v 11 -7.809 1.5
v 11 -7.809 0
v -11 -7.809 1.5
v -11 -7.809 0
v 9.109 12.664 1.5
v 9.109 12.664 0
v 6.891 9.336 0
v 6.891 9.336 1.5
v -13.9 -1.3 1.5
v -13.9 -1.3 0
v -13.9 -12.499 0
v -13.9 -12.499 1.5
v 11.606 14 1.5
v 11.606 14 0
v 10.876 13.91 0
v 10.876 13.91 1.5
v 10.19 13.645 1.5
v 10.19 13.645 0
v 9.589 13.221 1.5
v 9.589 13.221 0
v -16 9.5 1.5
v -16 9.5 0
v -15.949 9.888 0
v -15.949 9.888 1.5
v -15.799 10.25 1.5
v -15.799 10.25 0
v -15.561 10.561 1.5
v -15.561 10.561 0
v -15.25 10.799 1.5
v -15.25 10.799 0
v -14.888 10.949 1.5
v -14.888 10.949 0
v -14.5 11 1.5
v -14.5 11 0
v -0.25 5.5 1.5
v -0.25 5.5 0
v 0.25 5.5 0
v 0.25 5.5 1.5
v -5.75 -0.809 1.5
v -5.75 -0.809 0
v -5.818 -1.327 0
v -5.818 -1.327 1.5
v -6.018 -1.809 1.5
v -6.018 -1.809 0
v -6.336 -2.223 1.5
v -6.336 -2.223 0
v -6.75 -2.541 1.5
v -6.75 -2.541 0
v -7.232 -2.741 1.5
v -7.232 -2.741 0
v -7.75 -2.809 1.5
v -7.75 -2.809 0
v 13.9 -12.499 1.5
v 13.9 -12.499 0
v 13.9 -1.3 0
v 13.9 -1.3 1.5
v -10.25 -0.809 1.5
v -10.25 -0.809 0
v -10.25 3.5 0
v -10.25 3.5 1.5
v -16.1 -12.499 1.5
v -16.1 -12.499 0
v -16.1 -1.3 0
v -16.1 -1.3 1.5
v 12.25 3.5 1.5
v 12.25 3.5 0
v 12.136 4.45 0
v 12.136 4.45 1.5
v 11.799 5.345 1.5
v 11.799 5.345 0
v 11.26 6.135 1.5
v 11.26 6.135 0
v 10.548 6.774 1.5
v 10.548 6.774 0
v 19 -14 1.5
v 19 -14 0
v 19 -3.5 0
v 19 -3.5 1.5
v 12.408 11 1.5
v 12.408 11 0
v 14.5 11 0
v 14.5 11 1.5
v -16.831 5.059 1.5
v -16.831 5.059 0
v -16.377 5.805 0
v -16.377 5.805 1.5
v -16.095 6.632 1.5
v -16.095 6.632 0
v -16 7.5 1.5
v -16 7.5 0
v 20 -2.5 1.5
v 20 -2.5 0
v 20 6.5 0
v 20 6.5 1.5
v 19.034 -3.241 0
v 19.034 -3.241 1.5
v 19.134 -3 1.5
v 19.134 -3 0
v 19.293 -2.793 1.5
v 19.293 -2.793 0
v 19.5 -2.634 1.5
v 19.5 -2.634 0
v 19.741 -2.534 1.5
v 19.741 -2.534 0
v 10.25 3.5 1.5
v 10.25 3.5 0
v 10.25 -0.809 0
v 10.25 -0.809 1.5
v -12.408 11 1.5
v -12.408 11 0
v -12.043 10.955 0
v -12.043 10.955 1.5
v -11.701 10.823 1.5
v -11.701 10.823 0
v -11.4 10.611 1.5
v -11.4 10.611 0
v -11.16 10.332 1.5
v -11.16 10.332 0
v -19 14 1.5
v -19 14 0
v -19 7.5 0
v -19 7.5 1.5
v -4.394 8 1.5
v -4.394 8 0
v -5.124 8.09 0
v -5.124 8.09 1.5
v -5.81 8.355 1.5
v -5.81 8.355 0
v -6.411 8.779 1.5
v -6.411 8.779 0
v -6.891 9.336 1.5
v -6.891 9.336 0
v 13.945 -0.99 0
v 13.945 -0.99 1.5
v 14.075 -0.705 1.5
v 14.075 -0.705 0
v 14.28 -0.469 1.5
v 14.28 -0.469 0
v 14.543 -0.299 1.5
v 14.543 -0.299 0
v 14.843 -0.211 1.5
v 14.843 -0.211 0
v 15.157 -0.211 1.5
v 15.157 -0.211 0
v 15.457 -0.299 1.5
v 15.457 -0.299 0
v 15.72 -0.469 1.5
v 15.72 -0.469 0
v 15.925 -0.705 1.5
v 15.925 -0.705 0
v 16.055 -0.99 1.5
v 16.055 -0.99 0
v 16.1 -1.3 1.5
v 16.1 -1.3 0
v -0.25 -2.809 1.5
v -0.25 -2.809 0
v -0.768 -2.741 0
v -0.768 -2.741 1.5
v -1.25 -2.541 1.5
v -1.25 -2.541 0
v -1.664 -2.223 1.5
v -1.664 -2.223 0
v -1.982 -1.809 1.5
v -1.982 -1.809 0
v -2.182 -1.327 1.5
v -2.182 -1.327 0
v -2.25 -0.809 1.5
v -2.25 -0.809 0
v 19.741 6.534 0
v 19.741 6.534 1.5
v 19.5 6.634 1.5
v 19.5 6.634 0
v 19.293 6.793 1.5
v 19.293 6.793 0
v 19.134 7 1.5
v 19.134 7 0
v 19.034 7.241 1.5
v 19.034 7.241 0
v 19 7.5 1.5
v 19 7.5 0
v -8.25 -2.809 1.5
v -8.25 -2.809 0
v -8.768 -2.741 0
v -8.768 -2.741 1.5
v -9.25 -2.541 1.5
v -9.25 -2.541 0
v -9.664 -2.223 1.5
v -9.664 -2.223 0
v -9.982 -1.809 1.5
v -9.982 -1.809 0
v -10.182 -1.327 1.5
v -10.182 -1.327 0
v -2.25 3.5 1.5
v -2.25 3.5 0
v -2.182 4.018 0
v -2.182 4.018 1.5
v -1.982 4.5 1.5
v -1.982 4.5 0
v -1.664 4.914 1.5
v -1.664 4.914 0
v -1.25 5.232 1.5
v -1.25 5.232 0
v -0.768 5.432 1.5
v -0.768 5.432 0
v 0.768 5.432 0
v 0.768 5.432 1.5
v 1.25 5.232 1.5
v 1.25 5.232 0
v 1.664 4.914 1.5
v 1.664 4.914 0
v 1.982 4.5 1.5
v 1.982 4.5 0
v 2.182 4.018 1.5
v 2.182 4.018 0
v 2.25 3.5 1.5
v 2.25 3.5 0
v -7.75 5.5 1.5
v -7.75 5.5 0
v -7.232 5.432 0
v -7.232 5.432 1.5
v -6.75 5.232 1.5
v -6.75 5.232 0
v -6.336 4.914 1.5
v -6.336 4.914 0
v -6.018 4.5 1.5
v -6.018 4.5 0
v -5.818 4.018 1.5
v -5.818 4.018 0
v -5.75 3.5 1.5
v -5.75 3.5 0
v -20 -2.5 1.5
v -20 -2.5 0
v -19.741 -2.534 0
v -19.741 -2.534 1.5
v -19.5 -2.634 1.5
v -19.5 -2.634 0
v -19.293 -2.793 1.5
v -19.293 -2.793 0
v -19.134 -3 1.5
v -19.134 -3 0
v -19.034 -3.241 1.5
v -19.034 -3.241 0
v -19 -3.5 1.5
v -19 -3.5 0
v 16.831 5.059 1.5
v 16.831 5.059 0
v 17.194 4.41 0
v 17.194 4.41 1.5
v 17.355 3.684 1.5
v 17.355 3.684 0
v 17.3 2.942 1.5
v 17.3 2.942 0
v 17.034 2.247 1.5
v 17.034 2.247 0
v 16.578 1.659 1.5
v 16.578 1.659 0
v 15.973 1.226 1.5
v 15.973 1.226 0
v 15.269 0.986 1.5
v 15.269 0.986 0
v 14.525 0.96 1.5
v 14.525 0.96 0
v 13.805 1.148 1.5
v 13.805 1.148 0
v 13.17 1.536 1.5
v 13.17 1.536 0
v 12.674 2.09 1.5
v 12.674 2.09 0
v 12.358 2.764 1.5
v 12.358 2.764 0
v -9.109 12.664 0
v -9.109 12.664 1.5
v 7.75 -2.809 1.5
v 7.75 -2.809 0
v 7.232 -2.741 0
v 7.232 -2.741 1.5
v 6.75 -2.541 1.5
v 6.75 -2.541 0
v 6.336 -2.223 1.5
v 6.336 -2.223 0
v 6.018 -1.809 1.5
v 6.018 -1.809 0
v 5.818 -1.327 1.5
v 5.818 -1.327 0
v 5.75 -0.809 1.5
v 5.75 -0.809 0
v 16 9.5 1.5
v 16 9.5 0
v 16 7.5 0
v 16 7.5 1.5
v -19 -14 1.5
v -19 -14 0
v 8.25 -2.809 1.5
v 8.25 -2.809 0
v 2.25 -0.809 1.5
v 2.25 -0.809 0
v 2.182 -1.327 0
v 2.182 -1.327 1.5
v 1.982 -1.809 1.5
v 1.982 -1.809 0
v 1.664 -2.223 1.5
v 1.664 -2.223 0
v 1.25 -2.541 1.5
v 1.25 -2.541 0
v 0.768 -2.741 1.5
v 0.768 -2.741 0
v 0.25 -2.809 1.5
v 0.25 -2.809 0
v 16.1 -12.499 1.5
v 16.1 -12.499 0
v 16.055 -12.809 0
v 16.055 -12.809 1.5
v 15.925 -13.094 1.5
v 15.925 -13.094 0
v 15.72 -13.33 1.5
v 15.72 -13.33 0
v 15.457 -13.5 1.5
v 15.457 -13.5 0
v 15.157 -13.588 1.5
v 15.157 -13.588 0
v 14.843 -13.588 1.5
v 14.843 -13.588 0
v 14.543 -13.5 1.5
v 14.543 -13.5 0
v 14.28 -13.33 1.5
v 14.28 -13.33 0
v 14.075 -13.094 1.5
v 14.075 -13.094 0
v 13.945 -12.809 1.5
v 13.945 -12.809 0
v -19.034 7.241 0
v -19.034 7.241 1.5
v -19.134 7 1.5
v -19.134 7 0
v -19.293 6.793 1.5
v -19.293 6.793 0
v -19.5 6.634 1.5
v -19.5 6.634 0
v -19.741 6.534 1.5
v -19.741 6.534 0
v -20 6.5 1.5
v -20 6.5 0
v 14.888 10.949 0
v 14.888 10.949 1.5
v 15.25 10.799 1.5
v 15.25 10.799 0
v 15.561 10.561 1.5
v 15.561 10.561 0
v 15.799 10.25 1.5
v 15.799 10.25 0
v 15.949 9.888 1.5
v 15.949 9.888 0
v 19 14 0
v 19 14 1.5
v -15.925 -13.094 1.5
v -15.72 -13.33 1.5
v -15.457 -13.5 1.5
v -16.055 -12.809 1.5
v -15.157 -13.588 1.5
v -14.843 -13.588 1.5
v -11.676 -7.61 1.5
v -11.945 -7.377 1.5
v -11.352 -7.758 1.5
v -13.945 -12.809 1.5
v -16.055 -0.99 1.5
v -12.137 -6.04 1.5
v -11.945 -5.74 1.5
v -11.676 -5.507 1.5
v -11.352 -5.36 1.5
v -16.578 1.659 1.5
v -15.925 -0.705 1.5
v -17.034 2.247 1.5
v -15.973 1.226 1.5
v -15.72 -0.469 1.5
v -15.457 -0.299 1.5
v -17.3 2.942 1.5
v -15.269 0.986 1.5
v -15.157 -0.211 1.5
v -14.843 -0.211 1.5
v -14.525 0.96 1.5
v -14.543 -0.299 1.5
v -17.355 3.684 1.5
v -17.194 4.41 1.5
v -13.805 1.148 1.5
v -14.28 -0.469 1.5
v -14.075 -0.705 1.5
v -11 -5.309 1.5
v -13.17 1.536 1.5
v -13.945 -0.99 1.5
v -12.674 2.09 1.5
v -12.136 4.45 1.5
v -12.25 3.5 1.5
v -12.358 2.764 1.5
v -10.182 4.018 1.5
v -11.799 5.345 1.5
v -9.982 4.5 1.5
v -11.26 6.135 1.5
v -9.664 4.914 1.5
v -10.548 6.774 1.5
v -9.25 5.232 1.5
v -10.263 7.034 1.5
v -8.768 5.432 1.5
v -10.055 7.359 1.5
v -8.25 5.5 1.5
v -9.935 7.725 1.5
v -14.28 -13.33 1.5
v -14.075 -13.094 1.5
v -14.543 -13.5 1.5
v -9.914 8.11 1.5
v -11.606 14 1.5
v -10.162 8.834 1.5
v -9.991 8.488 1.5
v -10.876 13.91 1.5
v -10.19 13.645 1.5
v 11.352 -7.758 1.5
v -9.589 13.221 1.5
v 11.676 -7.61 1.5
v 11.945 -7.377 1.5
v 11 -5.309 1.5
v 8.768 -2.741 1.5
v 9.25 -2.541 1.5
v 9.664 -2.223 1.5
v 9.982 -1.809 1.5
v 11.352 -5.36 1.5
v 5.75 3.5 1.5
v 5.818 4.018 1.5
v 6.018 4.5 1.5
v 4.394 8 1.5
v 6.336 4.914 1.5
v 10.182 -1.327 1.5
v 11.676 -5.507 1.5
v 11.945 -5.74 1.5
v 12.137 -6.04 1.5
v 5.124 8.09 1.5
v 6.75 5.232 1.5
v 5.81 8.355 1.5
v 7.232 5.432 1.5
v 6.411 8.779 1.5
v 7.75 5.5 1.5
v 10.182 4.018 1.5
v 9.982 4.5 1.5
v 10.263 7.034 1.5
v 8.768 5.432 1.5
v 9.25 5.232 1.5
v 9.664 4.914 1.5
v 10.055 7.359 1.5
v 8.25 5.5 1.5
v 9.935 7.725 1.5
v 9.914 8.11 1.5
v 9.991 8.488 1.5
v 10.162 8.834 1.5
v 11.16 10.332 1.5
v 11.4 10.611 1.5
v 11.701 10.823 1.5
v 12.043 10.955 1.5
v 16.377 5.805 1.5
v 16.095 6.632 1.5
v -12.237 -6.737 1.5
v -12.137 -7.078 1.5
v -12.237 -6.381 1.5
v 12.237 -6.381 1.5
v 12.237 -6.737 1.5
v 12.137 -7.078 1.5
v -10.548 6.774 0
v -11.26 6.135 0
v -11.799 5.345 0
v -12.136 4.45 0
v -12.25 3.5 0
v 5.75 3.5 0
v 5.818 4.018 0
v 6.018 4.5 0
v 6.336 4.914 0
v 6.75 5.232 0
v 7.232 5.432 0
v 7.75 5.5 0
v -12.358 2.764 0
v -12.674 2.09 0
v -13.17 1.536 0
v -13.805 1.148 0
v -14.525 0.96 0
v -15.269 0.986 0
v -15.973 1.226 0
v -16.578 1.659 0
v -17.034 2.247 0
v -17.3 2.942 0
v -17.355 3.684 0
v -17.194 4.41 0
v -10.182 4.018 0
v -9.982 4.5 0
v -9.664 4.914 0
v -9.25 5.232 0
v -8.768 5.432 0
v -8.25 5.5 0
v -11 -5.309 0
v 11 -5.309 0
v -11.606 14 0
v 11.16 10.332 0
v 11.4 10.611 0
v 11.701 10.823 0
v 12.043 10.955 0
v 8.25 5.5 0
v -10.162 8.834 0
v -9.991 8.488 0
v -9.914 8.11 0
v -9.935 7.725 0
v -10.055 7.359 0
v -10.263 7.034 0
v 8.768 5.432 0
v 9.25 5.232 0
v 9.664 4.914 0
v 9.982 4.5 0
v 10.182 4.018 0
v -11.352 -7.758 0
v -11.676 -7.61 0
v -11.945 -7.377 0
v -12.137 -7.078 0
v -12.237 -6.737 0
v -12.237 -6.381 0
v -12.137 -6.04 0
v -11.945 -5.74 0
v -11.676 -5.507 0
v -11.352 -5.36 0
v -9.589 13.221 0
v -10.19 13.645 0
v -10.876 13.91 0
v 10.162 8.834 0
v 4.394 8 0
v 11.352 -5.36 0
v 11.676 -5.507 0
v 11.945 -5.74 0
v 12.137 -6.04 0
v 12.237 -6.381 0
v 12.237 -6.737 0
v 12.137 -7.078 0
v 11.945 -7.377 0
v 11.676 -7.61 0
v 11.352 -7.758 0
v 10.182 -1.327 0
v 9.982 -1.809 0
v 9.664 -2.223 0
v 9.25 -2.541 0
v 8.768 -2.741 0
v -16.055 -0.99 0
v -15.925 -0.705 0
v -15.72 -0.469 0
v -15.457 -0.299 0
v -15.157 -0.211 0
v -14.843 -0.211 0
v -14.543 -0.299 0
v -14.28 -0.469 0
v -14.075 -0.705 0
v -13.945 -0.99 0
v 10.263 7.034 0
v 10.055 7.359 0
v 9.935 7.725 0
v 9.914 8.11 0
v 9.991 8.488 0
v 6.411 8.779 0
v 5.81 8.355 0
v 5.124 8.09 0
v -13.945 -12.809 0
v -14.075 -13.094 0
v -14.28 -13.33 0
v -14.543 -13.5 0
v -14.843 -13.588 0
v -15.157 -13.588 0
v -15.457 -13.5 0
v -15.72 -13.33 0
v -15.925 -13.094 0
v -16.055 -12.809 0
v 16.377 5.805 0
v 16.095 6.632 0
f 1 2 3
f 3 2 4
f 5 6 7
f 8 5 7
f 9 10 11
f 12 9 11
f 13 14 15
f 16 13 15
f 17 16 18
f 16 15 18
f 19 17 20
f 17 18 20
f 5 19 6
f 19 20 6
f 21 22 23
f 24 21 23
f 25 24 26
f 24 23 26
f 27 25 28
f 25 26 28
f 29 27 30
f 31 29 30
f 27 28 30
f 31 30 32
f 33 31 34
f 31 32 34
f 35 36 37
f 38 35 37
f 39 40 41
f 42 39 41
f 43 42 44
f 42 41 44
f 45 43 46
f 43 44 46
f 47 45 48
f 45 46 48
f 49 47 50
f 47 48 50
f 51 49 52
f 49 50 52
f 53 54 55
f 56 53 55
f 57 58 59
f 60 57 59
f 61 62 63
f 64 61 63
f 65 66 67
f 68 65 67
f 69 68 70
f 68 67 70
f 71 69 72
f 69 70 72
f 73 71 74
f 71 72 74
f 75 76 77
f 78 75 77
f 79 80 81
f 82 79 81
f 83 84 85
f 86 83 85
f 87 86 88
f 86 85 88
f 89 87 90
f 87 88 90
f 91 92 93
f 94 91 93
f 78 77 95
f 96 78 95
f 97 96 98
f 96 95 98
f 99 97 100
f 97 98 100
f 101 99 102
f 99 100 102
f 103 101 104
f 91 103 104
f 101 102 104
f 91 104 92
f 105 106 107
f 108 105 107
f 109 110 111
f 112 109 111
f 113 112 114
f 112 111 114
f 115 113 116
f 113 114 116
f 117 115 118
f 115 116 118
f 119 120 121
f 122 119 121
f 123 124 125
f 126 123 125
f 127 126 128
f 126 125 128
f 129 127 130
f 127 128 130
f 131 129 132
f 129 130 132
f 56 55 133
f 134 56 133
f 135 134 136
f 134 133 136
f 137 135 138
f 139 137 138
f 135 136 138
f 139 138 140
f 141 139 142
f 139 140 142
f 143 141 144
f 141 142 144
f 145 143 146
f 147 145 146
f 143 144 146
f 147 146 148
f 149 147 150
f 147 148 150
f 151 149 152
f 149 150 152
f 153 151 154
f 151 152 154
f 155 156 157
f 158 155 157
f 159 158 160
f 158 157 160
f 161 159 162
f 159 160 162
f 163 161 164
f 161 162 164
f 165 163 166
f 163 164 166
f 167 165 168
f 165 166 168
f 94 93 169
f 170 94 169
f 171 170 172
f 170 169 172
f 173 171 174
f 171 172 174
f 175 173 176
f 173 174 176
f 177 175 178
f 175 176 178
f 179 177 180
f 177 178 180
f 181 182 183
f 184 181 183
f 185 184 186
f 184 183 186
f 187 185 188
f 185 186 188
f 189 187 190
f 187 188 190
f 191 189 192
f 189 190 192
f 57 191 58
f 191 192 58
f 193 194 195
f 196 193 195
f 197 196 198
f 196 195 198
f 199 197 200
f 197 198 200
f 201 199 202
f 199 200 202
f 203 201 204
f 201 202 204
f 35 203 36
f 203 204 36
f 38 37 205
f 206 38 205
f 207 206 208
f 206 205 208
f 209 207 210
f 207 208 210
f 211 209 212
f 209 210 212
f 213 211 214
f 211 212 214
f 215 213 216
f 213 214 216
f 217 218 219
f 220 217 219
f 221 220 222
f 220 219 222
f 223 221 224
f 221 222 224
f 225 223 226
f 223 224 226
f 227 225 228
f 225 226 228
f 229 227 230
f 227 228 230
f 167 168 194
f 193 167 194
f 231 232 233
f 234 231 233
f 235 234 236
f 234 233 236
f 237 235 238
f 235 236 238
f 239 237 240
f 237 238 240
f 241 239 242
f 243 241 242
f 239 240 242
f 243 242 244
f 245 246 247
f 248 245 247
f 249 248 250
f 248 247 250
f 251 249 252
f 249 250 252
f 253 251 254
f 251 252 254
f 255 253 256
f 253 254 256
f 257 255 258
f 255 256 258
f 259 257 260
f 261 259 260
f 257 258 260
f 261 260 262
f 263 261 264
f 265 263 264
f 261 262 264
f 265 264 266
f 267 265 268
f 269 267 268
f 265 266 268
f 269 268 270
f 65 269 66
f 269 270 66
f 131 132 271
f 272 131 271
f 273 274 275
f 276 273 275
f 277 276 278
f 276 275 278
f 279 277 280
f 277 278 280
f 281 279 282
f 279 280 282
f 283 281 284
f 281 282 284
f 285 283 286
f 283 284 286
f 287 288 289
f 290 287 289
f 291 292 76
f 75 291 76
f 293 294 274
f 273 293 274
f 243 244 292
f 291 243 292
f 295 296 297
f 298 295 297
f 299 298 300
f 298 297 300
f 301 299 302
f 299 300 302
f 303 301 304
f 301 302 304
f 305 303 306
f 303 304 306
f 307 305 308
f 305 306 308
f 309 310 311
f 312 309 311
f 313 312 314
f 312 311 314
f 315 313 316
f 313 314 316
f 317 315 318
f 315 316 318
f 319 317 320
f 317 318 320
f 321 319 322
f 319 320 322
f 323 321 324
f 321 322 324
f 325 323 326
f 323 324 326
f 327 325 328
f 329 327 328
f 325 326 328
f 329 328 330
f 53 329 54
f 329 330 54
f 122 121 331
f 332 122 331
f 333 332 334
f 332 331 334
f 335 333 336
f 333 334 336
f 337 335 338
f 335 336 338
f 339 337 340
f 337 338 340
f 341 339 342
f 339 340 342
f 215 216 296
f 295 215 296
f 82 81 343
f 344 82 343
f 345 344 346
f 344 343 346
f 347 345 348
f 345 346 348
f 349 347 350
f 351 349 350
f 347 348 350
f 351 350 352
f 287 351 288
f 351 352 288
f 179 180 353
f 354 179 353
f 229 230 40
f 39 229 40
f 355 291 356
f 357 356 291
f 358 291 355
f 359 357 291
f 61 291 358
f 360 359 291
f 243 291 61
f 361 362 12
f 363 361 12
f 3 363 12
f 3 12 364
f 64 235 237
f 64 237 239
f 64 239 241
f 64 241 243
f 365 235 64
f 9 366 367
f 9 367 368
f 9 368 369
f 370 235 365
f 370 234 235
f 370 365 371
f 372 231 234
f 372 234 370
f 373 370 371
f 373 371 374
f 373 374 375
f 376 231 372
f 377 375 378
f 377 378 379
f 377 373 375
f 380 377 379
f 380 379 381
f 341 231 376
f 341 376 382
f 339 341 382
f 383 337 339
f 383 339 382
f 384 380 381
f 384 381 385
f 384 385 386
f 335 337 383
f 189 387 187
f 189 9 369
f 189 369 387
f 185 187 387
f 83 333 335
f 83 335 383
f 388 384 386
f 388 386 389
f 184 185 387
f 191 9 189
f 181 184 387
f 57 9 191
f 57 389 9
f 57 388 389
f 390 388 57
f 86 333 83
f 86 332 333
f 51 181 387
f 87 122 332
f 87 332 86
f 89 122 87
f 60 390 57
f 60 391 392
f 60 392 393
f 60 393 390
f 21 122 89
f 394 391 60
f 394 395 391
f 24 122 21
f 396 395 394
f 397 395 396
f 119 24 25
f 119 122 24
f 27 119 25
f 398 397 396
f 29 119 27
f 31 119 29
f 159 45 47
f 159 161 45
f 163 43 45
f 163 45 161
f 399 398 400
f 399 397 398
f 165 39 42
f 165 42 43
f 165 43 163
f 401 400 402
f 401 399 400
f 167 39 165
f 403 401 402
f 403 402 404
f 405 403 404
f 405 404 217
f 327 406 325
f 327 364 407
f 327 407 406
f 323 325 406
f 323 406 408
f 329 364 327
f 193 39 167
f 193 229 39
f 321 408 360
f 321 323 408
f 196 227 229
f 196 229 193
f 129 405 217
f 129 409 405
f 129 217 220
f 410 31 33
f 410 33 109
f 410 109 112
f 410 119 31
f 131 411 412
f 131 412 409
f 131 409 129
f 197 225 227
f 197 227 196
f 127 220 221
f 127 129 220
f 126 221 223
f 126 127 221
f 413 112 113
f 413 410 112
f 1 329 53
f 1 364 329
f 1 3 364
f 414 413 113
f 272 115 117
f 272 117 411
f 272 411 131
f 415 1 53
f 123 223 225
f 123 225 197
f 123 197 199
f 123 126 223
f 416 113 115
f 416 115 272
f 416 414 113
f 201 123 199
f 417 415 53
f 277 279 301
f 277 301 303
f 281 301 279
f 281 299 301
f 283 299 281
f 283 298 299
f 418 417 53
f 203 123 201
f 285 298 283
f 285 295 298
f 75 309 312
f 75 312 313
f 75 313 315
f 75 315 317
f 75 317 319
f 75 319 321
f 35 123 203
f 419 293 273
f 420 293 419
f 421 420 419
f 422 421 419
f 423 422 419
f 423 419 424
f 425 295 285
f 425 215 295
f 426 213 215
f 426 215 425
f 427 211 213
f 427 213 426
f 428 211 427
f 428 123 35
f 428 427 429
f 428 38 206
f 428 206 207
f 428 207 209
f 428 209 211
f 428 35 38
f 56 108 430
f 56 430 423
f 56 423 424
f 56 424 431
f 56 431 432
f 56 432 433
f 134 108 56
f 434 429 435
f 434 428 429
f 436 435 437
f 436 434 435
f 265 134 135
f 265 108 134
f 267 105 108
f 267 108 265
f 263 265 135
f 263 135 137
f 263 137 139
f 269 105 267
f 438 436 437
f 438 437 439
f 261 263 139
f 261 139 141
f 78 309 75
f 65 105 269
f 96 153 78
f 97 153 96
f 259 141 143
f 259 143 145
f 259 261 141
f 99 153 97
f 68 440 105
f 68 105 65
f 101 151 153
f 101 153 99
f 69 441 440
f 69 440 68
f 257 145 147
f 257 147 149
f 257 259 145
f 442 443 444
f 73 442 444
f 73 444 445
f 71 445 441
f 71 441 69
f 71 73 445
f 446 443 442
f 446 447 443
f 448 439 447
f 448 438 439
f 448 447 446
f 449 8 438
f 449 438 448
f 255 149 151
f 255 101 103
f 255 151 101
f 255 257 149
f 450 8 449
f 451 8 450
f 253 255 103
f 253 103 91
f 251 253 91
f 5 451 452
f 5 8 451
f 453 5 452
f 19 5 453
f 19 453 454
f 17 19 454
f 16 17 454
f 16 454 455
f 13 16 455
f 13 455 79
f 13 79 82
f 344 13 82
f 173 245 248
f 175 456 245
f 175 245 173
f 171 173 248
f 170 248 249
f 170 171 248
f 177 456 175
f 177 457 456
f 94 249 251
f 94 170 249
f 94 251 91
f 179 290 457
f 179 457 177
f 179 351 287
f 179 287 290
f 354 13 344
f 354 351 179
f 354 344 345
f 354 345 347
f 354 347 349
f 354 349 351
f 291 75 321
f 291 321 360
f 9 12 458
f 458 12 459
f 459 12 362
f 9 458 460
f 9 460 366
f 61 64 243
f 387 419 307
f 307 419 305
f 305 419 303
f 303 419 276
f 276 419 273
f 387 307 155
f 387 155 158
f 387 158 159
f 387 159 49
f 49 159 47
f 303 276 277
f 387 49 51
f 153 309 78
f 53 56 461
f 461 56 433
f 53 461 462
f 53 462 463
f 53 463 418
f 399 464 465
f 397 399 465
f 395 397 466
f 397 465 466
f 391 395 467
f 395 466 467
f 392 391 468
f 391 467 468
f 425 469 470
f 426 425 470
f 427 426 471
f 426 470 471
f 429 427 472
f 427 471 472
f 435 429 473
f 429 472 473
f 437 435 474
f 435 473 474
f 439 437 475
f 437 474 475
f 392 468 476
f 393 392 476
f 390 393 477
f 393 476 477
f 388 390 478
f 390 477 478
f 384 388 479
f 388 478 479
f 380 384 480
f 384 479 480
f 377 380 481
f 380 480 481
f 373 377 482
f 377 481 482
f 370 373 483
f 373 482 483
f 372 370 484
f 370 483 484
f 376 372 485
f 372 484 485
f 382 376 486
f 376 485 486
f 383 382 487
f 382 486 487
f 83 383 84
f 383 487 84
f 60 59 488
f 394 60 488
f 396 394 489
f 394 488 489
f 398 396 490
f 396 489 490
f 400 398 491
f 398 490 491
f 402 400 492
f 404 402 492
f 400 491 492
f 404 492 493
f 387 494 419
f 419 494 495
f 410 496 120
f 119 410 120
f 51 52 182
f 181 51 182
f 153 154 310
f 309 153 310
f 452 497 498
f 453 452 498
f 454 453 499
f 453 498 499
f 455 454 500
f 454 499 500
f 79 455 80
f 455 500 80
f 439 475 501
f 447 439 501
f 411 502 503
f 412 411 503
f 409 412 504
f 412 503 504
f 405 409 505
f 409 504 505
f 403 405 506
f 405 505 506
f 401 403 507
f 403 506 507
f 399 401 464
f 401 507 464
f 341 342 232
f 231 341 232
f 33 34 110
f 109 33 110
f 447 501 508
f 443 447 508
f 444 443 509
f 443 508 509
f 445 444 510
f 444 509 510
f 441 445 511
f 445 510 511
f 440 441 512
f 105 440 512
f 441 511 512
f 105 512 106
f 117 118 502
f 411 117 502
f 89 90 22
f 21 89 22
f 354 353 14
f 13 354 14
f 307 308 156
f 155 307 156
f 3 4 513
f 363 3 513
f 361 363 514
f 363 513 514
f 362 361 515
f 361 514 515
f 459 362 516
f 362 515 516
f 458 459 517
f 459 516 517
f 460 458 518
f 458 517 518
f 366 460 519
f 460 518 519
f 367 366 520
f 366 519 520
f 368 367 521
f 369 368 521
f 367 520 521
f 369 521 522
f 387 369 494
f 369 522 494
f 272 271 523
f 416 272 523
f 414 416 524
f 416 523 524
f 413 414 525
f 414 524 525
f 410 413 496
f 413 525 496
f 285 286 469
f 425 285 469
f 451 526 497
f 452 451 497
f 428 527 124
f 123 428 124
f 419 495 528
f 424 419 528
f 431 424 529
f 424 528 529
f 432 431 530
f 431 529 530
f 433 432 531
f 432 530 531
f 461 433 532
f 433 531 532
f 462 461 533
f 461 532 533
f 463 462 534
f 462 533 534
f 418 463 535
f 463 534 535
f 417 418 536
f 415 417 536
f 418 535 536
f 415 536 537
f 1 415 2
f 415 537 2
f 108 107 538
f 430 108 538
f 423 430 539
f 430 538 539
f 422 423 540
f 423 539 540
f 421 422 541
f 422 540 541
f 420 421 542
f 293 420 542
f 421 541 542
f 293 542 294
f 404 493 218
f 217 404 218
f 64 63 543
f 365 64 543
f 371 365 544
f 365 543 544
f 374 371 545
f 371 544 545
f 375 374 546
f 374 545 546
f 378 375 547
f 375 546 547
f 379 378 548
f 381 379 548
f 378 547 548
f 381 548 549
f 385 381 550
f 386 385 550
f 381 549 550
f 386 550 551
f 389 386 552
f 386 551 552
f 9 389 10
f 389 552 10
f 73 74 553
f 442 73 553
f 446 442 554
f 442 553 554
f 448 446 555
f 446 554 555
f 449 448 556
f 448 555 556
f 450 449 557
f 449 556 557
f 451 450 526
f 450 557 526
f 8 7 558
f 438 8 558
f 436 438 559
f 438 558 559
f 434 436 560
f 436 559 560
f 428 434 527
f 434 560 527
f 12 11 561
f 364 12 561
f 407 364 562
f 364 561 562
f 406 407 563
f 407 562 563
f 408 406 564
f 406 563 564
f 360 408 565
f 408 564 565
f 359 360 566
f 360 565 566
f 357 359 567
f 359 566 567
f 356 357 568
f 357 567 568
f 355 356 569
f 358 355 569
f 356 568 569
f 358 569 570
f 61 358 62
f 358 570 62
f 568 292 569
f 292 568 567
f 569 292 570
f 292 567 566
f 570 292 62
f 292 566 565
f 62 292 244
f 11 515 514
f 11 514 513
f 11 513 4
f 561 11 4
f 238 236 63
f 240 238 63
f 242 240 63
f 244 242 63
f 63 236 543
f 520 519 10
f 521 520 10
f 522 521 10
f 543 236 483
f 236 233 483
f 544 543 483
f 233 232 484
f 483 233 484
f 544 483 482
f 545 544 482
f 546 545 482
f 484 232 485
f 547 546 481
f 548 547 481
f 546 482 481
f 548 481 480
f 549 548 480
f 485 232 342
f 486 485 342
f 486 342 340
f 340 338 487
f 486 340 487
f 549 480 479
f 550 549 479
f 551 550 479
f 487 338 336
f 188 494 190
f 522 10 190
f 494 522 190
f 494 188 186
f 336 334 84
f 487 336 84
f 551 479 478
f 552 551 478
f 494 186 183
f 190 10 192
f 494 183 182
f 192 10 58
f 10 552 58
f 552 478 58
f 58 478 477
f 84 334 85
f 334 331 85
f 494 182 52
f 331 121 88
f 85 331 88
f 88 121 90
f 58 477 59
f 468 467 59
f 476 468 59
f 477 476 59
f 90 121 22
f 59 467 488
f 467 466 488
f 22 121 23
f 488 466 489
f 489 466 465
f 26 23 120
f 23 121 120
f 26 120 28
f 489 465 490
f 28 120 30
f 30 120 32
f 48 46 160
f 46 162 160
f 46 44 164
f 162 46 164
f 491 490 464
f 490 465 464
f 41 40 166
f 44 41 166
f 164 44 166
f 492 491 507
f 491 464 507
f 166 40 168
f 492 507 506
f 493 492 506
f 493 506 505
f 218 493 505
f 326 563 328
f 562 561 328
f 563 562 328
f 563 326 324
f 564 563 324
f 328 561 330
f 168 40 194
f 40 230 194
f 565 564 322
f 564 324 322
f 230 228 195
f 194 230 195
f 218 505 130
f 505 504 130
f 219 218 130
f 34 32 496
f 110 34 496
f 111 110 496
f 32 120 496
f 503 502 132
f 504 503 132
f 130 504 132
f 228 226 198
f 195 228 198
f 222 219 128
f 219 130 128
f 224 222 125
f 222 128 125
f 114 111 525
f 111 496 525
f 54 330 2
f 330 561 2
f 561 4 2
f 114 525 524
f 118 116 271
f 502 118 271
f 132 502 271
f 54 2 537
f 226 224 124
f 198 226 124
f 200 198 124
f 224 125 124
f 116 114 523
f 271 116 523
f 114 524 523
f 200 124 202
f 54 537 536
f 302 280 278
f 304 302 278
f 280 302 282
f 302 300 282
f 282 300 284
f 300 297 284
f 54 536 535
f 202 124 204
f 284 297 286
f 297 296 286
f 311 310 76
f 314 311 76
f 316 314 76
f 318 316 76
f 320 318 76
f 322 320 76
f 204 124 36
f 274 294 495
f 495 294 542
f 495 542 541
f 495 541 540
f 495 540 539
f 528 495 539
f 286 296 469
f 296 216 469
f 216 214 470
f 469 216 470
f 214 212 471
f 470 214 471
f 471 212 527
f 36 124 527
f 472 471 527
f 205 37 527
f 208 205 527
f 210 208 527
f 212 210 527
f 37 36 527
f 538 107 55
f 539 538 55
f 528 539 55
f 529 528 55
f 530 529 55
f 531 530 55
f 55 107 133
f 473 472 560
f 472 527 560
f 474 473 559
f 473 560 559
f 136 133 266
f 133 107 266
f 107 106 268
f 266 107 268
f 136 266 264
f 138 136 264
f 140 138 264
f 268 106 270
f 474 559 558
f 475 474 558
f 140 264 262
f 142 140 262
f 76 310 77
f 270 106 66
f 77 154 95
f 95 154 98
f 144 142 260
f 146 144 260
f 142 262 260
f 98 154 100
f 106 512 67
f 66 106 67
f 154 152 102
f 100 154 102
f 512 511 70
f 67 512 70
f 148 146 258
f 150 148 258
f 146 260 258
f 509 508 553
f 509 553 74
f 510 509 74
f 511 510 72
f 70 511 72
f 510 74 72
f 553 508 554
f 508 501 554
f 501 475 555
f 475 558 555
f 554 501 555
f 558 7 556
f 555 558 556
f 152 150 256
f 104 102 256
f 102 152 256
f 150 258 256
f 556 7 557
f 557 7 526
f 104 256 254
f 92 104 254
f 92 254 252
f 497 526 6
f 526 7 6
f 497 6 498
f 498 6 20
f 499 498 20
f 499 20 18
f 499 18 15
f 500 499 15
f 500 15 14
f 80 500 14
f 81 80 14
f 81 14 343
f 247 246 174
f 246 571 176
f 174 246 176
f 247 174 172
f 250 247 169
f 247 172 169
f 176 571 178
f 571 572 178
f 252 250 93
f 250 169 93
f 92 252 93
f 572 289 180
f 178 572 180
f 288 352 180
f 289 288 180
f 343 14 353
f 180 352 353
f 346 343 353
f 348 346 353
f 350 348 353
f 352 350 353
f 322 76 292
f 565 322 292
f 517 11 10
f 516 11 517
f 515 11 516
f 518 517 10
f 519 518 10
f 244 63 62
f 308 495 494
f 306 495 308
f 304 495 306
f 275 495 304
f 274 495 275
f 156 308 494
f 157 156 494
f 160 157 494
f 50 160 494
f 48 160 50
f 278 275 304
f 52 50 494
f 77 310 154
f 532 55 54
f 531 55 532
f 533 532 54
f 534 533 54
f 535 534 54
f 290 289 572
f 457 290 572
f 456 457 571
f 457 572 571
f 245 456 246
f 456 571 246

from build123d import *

# Parameters (mm, degrees)
F1_DEPTH = 1.5


# Not quite as in the source:
# - ends of sketch curves that miss each other by under 0.0002 mm in the source are joined


with BuildPart() as f1:
    # F0 (on Top) → F1 (new body)
    with BuildSketch(Plane.XY):
        with BuildLine():
            ThreePointArc((20, 6.5), (19.2928932188, 6.7928932188), (19, 7.5))
            Line((19, 7.5), (19, 14))
            Line((19, 14), (11.605551, 14))
            ThreePointArc((11.605551, 14), (10.1899773457, 13.6450238617), (9.1094002708, 12.6641008194))
            Line((9.1094002708, 12.6641008194), (6.890599, 9.3359))
            ThreePointArc((6.890599, 9.3359), (5.8100220211, 8.3549763346), (4.394448, 8))
            Line((4.394448, 8), (-4.394449, 8))
            ThreePointArc((-4.394449, 8), (-5.8100230211, 8.3549763346), (-6.8906001907, 9.3358998729))
            Line((-6.8906001907, 9.3358998729), (-9.109401, 12.664101))
            ThreePointArc((-9.109401, 12.664101), (-10.1899783457, 13.6450238617), (-11.605552, 14))
            Line((-11.605552, 14), (-19, 14))
            Line((-19, 14), (-19, 7.5))
            ThreePointArc((-19, 7.5), (-19.2928932188, 6.7928932188), (-20, 6.5))
            Line((-20, 6.5), (-20, -2.5))
            ThreePointArc((-20, -2.5), (-19.2928932188, -2.7928932188), (-19, -3.5))
            Line((-19, -3.5), (-19, -14))
            Line((-19, -14), (19, -14))
            Line((19, -14), (19, -3.5))
            ThreePointArc((19, -3.5), (19.2928932188, -2.7928932188), (20, -2.5))
            Line((20, -2.5), (20, 6.5))
        make_face()
        with BuildLine():
            ThreePointArc((-13.9, -12.498995), (-15, -13.598995), (-16.1, -12.498995))
            Line((-16.1, -12.498995), (-16.1, -1.300086))
            ThreePointArc((-16.1, -1.300086), (-15, -0.200086), (-13.9, -1.300086))
            Line((-13.9, -1.300086), (-13.9, -12.498995))
        make_face(mode=Mode.SUBTRACT)
        with BuildLine():
            ThreePointArc((-11, -7.808873), (-12.25, -6.558873), (-11, -5.308873))
            Line((-11, -5.308873), (11, -5.308873))
            ThreePointArc((11, -5.308873), (12.25, -6.558873), (11, -7.808873))
            Line((11, -7.808873), (-11, -7.808873))
        make_face(mode=Mode.SUBTRACT)
        with BuildLine():
            ThreePointArc((16.1, -12.498995), (15, -13.598995), (13.9, -12.498995))
            Line((13.9, -12.498995), (13.9, -1.300086))
            ThreePointArc((13.9, -1.300086), (15, -0.200086), (16.1, -1.300086))
            Line((16.1, -1.300086), (16.1, -12.498995))
        make_face(mode=Mode.SUBTRACT)
        with BuildLine():
            ThreePointArc((-12.25, 3.5), (-15.6295091101, 1.0805038434), (-16.8308317088, 5.0594317757))
            ThreePointArc((-16.8308317088, 5.0594317757), (-16.2134004171, 6.2109446874), (-16, 7.5))
            Line((-16, 7.5), (-16, 9.5))
            ThreePointArc((-16, 9.5), (-15.5606601718, 10.5606601718), (-14.5, 11))
            Line((-14.5, 11), (-12.408327, 11))
            ThreePointArc((-12.408327, 11), (-11.7005404785, 10.8225120945), (-11.16025202, 10.3320509866))
            Line((-11.16025202, 10.3320509866), (-10.161512, 8.83394))
            ThreePointArc((-10.161512, 8.83394), (-9.935298233, 7.7253531463), (-10.5478817855, 6.7741016944))
            ThreePointArc((-10.5478817855, 6.7741016944), (-11.7990510276, 5.3450573983), (-12.25, 3.5))
        make_face(mode=Mode.SUBTRACT)
        with BuildLine():
            Line((-5.75, 3.5), (-5.75, -0.808873))
            ThreePointArc((-5.75, -0.808873), (-6.3357864376, -2.2230865624), (-7.75, -2.808873))
            Line((-7.75, -2.808873), (-8.25, -2.808873))
            ThreePointArc((-8.25, -2.808873), (-9.6642135624, -2.2230865624), (-10.25, -0.808873))
            Line((-10.25, -0.808873), (-10.25, 3.5))
            ThreePointArc((-10.25, 3.5), (-9.6642135624, 4.9142135624), (-8.25, 5.5))
            Line((-8.25, 5.5), (-7.75, 5.5))
            ThreePointArc((-7.75, 5.5), (-6.3357864376, 4.9142135624), (-5.75, 3.5))
        make_face(mode=Mode.SUBTRACT)
        with BuildLine():
            Line((2.25, 3.5), (2.25, -0.808873))
            ThreePointArc((2.25, -0.808873), (1.6642135624, -2.2230865624), (0.25, -2.808873))
            Line((0.25, -2.808873), (-0.25, -2.808873))
            ThreePointArc((-0.25, -2.808873), (-1.6642135624, -2.2230865624), (-2.25, -0.808873))
            Line((-2.25, -0.808873), (-2.25, 3.5))
            ThreePointArc((-2.25, 3.5), (-1.6642135624, 4.9142135624), (-0.25, 5.5))
            Line((-0.25, 5.5), (0.25, 5.5))
            ThreePointArc((0.25, 5.5), (1.6642135624, 4.9142135624), (2.25, 3.5))
        make_face(mode=Mode.SUBTRACT)
        with BuildLine():
            Line((10.25, 3.5), (10.25, -0.808873))
            ThreePointArc((10.25, -0.808873), (9.6642135624, -2.2230865624), (8.25, -2.808873))
            Line((8.25, -2.808873), (7.75, -2.808873))
            ThreePointArc((7.75, -2.808873), (6.3357864376, -2.2230865624), (5.75, -0.808873))
            Line((5.75, -0.808873), (5.75, 3.5))
            ThreePointArc((5.75, 3.5), (6.3357864376, 4.9142135624), (7.75, 5.5))
            Line((7.75, 5.5), (8.25, 5.5))
            ThreePointArc((8.25, 5.5), (9.6642135624, 4.9142135624), (10.25, 3.5))
        make_face(mode=Mode.SUBTRACT)
        with BuildLine():
            ThreePointArc((16.8308313365, 5.0594322592), (15.6295093989, 1.0805039417), (12.25, 3.5))
            ThreePointArc((12.25, 3.5), (11.7990508389, 5.3450577615), (10.5478809284, 6.774101898))
            ThreePointArc((10.5478809284, 6.774101898), (9.9352982087, 7.7253532759), (10.1615112508, 8.8339398328))
            Line((10.1615112508, 8.8339398328), (11.160251, 10.332051))
            ThreePointArc((11.160251, 10.332051), (11.700540234, 10.8225119636), (12.408327, 11))
            Line((12.408327, 11), (14.5, 11))
            ThreePointArc((14.5, 11), (15.5606601718, 10.5606601718), (16, 9.5))
            Line((16, 9.5), (16, 7.5))
            ThreePointArc((16, 7.5), (16.2134003188, 6.2109449762), (16.8308313365, 5.0594322592))
        make_face(mode=Mode.SUBTRACT)
    extrude(amount=F1_DEPTH)


solid = f1.part
